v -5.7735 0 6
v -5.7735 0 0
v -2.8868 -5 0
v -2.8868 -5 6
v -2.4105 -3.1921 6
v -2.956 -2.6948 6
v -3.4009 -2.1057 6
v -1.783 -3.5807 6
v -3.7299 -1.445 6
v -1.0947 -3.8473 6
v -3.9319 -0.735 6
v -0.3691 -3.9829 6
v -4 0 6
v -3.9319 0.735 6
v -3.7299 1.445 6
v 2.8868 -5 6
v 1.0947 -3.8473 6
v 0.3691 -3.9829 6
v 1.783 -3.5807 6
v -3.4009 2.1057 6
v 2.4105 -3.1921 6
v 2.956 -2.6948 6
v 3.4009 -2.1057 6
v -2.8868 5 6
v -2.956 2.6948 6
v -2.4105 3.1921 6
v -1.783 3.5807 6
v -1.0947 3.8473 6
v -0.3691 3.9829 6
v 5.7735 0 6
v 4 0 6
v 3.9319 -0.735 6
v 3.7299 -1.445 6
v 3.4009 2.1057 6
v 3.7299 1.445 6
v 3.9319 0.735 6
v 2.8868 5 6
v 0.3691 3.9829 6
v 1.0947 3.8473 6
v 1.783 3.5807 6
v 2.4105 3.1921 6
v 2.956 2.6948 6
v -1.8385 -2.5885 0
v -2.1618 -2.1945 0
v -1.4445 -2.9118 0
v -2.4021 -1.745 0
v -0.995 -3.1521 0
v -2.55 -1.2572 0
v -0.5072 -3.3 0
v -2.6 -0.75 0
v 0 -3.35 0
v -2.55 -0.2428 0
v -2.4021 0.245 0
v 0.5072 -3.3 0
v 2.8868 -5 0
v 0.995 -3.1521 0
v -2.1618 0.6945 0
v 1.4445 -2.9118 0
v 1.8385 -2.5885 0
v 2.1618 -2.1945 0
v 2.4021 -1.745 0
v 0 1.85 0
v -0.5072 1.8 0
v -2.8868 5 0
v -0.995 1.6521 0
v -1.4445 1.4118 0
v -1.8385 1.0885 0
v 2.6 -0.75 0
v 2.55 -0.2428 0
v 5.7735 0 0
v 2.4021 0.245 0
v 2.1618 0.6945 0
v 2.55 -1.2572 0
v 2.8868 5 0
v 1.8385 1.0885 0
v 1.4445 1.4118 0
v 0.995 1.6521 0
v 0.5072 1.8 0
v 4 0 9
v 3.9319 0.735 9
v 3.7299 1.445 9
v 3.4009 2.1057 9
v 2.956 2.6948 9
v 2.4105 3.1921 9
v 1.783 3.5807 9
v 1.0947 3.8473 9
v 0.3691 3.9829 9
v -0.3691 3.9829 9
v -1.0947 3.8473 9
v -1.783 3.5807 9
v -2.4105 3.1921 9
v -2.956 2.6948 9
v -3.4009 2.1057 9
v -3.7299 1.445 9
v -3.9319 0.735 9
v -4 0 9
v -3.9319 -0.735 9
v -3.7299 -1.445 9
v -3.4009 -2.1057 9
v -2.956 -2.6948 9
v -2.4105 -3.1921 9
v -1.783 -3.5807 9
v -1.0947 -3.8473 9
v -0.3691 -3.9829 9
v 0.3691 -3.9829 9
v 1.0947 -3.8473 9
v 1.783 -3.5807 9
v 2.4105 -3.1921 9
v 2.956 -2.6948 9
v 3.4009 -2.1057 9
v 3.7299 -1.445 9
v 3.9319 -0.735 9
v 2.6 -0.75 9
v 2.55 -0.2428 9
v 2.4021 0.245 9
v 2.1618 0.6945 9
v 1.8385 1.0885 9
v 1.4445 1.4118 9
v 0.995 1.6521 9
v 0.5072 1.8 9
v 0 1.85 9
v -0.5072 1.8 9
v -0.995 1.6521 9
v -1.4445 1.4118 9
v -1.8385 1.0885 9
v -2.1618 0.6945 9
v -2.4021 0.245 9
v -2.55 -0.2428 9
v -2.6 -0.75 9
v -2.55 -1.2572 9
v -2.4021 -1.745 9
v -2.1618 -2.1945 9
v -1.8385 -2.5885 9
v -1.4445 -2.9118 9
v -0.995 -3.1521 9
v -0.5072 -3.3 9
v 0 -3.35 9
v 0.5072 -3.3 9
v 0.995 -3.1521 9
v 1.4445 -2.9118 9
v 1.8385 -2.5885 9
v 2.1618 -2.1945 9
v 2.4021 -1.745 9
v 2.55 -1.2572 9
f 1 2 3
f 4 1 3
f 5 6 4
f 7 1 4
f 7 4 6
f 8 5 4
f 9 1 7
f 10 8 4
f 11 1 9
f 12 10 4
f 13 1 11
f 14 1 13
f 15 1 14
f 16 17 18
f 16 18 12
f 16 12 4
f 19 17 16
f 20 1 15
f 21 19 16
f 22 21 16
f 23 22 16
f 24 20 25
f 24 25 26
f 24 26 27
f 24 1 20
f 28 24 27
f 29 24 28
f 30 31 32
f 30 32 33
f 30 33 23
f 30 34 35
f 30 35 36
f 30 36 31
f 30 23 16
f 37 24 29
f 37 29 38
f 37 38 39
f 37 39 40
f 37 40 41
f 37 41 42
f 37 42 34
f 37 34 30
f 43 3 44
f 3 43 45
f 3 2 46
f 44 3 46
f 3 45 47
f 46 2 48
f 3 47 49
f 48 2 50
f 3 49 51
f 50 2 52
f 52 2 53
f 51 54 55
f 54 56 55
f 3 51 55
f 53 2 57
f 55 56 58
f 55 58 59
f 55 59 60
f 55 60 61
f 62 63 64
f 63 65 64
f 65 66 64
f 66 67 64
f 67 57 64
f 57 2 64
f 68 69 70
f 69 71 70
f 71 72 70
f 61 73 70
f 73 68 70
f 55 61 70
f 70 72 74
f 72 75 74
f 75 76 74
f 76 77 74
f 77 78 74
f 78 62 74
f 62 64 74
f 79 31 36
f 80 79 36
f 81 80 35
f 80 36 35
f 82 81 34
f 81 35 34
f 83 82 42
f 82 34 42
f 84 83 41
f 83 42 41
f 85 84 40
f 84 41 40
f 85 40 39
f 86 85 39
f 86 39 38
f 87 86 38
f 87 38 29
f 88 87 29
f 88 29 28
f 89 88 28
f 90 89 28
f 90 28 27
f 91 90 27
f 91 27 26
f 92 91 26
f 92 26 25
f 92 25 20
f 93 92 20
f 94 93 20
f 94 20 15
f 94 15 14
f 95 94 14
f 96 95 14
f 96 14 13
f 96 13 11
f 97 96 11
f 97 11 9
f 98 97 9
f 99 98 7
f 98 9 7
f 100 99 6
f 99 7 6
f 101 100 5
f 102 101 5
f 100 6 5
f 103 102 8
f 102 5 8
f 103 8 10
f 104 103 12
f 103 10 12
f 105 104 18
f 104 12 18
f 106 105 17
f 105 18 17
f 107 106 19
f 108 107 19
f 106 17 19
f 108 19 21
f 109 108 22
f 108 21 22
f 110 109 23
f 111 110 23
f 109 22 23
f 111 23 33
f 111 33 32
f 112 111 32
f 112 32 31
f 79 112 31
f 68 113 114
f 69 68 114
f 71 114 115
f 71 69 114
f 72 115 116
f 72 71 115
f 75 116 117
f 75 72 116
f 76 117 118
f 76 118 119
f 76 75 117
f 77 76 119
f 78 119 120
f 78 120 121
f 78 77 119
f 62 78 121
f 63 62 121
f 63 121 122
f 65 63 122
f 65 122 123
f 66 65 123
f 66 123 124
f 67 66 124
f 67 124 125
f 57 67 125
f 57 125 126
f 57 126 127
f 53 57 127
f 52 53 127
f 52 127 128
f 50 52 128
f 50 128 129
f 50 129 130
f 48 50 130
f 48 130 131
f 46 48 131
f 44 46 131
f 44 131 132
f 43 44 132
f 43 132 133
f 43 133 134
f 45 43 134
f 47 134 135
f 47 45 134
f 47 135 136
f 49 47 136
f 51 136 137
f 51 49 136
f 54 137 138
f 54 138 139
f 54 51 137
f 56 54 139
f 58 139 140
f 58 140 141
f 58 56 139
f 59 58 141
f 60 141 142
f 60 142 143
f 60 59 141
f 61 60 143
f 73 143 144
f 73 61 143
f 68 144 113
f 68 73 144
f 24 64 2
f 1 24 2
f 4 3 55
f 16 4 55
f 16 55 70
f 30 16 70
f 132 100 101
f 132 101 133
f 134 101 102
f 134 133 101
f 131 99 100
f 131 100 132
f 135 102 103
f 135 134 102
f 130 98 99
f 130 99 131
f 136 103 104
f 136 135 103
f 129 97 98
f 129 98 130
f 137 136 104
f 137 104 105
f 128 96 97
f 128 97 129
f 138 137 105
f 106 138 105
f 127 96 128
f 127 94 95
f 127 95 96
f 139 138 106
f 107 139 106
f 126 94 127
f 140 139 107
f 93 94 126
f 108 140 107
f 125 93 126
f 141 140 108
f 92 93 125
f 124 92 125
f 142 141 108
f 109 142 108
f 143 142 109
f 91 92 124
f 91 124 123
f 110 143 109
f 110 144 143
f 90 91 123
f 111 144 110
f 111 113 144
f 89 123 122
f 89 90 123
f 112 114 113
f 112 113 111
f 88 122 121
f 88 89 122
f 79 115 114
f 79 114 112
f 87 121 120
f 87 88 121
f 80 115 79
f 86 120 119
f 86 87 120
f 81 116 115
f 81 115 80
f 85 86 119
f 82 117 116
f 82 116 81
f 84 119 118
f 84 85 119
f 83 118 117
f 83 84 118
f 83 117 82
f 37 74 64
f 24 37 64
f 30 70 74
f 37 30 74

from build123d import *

# Parameters (mm, degrees)
F2_R     = 4
F2_R_2   = 2.6
F3_DEPTH = 6
F4_DEPTH = 9


with BuildPart() as f3:
    # F2 (on Top) → F3 (new body)
    with BuildSketch(Plane.XY):
        Polygon((2.8867513459, 5), (-2.8867513459, 5), (-5.7735026919, 0), (-2.8867513459, -5), (2.8867513459, -5), (5.7735026919, 0), align=None)
        Circle(F2_R, mode=Mode.SUBTRACT)
        Circle(F2_R)
        with Locations((0, -0.75)):
            Circle(F2_R_2, mode=Mode.SUBTRACT)
    extrude(amount=F3_DEPTH)

    # F2 (on Top) → F4 (join)
    with BuildSketch(Plane.XY):
        Circle(F2_R)
        with Locations((0, -0.75)):
            Circle(F2_R_2, mode=Mode.SUBTRACT)
    extrude(amount=F4_DEPTH)


solid = f3.part
